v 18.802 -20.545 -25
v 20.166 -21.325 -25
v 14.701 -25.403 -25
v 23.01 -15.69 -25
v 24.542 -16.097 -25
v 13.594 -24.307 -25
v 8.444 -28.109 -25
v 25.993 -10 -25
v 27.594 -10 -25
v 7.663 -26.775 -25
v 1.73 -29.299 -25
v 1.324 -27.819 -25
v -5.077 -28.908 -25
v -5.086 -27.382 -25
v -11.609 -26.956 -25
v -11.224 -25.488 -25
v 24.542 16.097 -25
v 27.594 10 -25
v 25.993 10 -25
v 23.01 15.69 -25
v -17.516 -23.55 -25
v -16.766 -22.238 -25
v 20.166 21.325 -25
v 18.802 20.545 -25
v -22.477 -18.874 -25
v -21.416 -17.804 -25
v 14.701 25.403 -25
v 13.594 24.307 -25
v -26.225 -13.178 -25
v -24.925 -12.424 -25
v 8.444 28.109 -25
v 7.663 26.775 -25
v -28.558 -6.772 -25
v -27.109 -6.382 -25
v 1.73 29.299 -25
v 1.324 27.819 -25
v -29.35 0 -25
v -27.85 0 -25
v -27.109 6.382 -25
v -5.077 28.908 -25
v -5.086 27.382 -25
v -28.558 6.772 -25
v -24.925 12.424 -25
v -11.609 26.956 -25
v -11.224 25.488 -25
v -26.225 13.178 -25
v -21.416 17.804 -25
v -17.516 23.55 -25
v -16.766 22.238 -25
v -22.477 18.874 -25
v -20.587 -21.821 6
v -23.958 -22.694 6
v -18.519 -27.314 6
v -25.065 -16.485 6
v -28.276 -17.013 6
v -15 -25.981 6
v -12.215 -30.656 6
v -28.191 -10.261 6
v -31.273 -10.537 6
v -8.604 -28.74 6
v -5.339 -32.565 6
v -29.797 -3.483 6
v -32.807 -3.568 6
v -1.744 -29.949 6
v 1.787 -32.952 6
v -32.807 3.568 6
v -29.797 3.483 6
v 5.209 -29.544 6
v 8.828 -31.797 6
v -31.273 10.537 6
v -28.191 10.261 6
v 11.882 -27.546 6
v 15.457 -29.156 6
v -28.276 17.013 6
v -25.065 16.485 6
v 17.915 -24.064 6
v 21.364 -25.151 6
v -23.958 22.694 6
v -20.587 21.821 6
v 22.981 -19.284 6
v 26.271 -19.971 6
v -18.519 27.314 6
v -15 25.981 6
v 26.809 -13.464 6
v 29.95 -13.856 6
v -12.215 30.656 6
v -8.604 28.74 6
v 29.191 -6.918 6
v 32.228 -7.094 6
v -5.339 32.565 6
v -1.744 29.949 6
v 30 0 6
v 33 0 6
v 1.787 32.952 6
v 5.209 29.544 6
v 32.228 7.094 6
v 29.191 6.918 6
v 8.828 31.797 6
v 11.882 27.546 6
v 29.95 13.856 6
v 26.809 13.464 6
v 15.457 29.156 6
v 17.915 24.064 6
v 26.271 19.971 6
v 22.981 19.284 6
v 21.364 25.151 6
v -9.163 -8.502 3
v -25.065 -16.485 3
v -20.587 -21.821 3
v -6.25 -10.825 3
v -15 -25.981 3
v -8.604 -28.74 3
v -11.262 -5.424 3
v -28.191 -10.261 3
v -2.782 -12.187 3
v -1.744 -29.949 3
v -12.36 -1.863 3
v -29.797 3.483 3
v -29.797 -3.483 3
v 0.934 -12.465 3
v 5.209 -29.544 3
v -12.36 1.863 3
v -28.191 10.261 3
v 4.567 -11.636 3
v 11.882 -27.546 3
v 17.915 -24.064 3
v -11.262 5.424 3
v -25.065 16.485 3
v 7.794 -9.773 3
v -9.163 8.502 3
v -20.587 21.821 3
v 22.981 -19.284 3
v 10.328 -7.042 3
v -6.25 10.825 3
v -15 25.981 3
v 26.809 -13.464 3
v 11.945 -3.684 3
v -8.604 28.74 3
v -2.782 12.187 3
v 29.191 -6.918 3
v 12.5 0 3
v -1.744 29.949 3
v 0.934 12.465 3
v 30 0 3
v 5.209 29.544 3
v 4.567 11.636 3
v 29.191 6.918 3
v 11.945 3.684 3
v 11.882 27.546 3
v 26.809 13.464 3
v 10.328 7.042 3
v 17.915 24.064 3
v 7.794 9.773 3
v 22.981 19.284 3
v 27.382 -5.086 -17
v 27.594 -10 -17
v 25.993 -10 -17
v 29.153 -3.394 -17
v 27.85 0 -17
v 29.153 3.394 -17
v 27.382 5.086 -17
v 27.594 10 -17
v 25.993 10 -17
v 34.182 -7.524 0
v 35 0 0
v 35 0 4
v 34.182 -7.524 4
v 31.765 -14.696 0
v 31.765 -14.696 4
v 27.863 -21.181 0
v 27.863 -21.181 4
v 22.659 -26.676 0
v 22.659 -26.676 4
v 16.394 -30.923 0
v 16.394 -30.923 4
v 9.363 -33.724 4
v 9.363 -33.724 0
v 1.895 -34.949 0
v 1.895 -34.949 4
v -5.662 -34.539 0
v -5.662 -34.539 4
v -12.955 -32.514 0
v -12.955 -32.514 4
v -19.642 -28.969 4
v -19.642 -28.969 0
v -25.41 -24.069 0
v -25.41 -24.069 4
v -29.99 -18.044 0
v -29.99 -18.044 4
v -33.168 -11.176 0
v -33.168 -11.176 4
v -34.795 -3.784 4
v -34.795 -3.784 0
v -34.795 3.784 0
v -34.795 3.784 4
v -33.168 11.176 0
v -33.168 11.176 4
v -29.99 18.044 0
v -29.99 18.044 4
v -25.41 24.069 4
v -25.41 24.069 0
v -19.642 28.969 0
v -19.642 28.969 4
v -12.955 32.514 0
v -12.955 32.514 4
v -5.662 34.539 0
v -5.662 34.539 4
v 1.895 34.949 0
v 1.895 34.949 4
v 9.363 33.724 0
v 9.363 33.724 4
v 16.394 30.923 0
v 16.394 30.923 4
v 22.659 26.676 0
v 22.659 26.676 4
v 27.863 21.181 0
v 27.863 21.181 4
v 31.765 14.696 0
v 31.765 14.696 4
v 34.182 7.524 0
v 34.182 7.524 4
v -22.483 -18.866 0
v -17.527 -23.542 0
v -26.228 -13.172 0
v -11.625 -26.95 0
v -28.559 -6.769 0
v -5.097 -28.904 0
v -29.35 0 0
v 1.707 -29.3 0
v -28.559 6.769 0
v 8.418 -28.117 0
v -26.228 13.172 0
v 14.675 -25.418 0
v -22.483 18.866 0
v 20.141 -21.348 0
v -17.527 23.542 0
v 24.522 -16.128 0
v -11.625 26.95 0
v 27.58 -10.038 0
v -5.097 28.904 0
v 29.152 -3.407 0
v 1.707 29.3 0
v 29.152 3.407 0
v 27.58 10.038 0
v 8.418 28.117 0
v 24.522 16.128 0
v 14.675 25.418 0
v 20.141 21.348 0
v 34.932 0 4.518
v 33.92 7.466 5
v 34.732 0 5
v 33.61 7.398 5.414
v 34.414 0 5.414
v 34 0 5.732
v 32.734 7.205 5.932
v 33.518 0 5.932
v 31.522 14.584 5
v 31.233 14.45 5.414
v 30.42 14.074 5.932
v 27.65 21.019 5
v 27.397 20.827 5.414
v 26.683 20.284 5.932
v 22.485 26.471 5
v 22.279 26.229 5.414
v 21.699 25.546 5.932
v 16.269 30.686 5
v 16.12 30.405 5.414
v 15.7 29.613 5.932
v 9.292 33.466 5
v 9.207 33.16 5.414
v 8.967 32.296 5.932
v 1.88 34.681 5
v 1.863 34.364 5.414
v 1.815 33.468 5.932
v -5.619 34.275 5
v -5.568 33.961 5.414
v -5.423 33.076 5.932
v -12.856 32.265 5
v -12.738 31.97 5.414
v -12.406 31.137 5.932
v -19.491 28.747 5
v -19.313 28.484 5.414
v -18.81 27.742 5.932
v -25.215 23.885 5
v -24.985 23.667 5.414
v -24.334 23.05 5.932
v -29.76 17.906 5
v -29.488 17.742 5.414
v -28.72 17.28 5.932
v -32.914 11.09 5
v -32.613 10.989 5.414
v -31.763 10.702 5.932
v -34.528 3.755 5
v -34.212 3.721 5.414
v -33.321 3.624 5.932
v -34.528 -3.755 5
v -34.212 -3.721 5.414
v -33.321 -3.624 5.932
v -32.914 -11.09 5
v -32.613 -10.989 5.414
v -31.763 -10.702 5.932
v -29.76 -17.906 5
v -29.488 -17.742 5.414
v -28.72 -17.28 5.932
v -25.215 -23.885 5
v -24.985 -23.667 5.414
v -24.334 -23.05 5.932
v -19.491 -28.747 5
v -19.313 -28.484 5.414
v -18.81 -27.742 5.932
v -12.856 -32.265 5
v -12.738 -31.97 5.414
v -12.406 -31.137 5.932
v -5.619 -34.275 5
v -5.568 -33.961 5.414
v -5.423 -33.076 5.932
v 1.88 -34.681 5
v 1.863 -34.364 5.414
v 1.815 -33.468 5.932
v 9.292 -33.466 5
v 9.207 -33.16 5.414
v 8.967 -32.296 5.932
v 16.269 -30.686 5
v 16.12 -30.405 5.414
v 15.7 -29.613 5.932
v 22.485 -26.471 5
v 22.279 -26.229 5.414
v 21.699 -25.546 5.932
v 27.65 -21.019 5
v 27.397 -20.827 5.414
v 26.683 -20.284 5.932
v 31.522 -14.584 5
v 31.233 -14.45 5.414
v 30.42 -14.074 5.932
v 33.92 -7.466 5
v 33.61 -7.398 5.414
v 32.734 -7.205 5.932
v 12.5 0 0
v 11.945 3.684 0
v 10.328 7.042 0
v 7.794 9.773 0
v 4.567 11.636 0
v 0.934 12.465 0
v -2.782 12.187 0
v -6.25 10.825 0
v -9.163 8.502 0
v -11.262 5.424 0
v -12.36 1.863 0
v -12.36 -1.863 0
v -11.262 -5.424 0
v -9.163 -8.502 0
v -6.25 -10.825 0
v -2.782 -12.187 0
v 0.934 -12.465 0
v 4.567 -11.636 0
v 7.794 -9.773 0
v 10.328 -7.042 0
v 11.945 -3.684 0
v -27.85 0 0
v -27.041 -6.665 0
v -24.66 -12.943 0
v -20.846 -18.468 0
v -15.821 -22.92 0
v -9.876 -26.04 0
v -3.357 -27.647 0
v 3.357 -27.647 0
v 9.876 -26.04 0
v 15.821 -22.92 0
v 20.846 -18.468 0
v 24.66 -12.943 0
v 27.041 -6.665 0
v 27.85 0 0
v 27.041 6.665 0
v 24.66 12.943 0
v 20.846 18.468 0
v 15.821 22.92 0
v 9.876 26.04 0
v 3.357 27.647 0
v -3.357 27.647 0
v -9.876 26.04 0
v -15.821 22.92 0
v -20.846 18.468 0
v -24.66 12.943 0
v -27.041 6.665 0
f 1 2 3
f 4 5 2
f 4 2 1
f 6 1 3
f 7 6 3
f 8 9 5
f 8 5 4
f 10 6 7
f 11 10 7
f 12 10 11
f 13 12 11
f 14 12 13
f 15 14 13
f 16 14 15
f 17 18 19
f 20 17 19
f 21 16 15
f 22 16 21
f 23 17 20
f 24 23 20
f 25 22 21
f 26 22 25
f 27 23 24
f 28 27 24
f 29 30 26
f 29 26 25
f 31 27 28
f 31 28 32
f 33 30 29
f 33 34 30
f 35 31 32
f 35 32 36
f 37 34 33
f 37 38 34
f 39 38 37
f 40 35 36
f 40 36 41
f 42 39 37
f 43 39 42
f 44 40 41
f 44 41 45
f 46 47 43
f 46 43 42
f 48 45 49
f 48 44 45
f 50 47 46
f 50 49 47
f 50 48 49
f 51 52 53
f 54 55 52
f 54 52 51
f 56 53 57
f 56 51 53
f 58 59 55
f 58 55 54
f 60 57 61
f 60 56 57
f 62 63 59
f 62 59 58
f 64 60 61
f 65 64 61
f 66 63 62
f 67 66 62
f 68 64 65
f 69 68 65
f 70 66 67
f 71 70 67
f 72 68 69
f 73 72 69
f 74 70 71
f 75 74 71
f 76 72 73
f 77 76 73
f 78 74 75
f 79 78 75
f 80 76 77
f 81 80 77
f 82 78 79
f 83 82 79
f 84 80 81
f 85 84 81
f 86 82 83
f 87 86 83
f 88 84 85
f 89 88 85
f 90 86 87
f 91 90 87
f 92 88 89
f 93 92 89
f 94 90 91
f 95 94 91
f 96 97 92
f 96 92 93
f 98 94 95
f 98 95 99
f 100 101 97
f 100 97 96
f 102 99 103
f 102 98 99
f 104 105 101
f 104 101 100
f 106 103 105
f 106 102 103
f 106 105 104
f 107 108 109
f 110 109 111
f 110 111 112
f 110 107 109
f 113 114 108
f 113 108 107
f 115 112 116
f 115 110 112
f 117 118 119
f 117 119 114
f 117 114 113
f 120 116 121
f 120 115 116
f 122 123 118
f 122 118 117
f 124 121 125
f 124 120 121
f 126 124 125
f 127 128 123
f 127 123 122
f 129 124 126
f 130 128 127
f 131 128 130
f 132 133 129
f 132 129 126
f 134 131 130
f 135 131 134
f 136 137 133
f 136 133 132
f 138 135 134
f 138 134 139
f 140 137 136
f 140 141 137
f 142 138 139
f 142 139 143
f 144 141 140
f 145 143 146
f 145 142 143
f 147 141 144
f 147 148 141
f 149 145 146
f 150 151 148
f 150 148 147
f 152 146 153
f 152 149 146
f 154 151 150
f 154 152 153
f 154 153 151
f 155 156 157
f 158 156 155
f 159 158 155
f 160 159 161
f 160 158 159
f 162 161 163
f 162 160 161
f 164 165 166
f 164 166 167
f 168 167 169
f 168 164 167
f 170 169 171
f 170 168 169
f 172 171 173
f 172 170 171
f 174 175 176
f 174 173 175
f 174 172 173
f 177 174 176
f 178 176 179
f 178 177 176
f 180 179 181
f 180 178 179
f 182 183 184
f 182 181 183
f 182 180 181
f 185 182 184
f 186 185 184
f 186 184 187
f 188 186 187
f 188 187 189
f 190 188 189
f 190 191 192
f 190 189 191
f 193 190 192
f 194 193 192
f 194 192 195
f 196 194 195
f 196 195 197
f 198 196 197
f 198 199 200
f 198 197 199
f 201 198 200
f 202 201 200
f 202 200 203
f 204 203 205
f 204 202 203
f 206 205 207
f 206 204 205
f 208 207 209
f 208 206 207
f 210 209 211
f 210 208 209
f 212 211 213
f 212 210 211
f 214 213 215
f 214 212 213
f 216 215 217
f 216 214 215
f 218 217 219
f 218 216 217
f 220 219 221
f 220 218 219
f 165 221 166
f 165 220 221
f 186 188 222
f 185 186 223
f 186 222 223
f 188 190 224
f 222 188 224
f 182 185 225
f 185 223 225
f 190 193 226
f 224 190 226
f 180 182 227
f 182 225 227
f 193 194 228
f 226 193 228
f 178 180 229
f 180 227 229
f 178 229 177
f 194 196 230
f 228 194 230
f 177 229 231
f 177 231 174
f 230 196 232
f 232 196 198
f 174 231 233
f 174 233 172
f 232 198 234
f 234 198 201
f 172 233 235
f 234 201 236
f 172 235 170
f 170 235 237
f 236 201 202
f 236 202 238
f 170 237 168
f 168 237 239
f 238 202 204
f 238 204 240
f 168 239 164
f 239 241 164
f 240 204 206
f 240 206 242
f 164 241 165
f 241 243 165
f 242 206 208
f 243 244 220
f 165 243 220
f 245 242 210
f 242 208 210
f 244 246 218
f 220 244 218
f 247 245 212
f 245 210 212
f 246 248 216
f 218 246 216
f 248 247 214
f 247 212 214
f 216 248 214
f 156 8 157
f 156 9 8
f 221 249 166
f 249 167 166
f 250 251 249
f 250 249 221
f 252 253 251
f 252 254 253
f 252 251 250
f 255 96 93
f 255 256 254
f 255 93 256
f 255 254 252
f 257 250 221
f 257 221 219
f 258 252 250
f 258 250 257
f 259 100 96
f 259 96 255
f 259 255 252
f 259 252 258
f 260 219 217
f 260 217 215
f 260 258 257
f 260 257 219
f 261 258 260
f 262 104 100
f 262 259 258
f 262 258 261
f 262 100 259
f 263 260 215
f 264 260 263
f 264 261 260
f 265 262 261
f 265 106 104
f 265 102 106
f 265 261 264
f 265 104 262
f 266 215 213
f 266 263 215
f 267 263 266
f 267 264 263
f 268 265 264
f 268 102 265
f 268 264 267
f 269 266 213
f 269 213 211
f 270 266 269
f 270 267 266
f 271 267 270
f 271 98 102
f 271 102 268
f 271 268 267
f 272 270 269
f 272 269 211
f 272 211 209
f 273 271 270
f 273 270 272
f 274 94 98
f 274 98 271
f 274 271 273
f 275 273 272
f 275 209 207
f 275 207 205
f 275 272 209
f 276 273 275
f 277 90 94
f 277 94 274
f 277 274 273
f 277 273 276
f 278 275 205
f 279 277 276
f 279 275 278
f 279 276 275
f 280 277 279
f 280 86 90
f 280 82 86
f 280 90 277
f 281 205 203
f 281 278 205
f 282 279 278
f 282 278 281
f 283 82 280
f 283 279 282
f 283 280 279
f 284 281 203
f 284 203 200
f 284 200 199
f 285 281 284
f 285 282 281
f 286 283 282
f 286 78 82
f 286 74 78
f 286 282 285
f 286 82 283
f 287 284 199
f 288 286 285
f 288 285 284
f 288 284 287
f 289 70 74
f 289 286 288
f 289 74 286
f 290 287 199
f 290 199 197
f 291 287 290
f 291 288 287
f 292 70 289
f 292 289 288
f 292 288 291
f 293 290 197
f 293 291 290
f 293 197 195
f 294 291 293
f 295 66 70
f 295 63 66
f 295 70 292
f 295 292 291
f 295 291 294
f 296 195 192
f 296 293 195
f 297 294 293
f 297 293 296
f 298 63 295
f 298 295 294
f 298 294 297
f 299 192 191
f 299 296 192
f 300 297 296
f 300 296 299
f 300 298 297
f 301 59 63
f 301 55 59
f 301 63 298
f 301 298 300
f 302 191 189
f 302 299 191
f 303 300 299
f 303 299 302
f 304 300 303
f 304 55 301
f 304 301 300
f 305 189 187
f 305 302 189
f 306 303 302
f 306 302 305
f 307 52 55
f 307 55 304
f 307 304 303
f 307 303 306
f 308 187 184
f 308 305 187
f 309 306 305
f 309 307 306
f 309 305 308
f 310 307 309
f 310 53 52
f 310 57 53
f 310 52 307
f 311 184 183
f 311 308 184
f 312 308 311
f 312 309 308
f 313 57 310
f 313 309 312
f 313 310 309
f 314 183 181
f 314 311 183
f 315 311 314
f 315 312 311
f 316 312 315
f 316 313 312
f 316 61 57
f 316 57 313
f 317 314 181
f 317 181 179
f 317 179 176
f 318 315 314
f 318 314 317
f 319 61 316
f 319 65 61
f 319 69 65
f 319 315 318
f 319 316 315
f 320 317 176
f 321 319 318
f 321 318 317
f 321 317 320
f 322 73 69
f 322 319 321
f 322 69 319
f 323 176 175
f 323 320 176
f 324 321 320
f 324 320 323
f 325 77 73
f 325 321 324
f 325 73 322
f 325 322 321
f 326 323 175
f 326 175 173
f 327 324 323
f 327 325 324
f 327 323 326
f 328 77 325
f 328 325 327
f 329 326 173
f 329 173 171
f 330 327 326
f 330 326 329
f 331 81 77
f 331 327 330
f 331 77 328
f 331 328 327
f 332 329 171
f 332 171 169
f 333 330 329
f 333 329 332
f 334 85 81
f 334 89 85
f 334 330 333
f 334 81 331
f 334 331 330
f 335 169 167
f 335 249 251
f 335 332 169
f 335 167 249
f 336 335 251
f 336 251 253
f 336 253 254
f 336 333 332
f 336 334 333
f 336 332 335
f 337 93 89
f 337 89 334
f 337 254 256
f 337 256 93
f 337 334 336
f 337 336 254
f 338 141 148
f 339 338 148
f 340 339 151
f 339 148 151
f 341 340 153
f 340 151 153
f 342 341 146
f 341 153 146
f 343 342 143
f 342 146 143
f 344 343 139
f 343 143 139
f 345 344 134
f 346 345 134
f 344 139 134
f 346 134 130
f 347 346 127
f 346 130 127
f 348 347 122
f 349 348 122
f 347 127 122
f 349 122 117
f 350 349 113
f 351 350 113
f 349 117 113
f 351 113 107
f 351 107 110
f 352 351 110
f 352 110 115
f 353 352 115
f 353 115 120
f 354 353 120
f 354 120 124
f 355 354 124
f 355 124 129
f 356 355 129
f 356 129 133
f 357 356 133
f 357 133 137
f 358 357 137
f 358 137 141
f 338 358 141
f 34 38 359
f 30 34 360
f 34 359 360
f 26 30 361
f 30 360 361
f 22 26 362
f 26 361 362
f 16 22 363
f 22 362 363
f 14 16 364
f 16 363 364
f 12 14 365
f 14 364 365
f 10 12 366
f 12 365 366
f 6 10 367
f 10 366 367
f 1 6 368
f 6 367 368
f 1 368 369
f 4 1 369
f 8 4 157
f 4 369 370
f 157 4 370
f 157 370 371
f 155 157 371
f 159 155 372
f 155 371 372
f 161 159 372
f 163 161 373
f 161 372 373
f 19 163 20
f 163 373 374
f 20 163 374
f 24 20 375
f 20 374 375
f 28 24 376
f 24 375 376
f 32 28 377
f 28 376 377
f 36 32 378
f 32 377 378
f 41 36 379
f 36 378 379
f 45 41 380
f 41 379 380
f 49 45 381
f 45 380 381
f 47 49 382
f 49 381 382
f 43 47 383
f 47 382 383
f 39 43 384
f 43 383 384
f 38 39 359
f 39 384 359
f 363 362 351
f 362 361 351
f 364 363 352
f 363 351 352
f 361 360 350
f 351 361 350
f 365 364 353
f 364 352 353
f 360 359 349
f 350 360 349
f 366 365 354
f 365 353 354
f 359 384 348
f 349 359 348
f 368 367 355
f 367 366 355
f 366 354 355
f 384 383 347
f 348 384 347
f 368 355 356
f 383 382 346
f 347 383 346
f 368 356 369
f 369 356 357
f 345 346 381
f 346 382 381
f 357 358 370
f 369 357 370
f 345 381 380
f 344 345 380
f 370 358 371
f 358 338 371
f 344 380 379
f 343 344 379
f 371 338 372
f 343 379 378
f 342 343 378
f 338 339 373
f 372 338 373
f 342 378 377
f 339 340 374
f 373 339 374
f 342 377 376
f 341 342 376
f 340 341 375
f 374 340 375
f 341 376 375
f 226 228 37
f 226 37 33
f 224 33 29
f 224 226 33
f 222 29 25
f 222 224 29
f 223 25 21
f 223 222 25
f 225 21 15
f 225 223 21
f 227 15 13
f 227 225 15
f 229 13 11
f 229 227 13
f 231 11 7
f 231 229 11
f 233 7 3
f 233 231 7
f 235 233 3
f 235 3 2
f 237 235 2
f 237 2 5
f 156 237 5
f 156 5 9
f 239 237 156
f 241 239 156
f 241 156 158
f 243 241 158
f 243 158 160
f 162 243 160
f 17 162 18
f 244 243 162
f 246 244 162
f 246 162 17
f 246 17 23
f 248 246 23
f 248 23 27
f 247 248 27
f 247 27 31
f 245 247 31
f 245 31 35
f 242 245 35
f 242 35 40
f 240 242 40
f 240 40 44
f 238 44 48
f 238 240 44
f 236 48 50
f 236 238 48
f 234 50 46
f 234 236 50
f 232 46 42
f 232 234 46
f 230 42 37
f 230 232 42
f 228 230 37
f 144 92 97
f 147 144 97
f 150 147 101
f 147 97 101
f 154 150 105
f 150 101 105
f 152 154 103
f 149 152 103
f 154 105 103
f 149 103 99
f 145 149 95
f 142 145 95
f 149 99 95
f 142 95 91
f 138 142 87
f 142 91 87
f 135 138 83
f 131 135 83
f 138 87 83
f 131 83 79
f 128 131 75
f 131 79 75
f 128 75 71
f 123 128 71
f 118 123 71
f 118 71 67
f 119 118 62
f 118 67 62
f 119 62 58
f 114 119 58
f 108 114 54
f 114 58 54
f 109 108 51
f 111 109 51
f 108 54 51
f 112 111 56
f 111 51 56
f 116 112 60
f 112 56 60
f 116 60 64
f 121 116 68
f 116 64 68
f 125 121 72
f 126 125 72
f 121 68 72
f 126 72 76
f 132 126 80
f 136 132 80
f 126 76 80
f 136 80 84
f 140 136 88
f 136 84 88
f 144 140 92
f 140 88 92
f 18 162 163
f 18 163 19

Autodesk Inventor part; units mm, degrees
ref_plane "XZ Plane" through (0, 0, 0) normal (0, 1, 0) x (-1, 0, 0)
ref_plane "XY Plane" through (0, 0, 0) normal (0, 0, 1) x (1, 0, 0)
sketch "Sketch1" plane through (0, 0, 0) normal (0, 0, 1) x (1, 0, 0)
  circle A0 centre (0, 0) radius 35
  dimension "d0" = 70
extrude "Extrusion1" add sketch "Sketch1" along normal blind 6
sketch "Sketch2" plane through (0, 0, 6) normal (0, 0, 1) x (1, 0, 0)
  circle A0 centre (0, 0) radius 35 projected
  circle A1 centre (0, 0) radius 30
  dimension "d3" = 60
extrude "Extrusion2" cut sketch "Sketch2" against normal blind 3 contours A1
sketch "Sketch3" plane through (0, 0, 0) normal (0, 0, -1) x (-1, 0, 0)
  circle A0 centre (0, 0) radius 35 projected
  circle A1 centre (0, 0) radius 29.35
  circle A2 centre (0, 0) radius 27.85
  dimension "d6" = 58.7
  dimension "d7" = 55.7
extrude "Extrusion3" add sketch "Sketch3" along normal blind 25 contours A1
fillet "Fillet1" radius 2 1 edges at (-35, 0, 6)
sketch "Sketch4" plane through (0, 0, 3) normal (0, 0, 1) x (1, 0, 0)
  circle A0 centre (0, 0) radius 30 projected
  circle A1 centre (0, 0) radius 12.5
  dimension "d11" = 25
extrude "Extrusion4" cut sketch "Sketch4" against normal blind 10 contours A1
ref_plane "Work Plane1" through (29.85, 0, 0) normal (1, 0, 0) x (0, 1, 0)
sketch "Sketch5" plane through (29.85, 0, 0) normal (1, 0, 0) x (0, 1, 0)
  line L0 (-10, -17) -> (10, -17)
  line L1 (10, -17) -> (10, -28.5985)
  line L2 (10, -28.5985) -> (-10, -28.5985)
  line L3 (-10, -28.5985) -> (-10, -17)
  line L4 (0, -31.2) -> (0, 12.2) projected
  line L5 (0, 0) -> (-49, 0)
  dimension "d15" = 20
  dimension "d17" = 17
extrude "Extrusion5" cut sketch "Sketch5" against normal blind 10
properties part number "Tapa_superior_carcasa"
